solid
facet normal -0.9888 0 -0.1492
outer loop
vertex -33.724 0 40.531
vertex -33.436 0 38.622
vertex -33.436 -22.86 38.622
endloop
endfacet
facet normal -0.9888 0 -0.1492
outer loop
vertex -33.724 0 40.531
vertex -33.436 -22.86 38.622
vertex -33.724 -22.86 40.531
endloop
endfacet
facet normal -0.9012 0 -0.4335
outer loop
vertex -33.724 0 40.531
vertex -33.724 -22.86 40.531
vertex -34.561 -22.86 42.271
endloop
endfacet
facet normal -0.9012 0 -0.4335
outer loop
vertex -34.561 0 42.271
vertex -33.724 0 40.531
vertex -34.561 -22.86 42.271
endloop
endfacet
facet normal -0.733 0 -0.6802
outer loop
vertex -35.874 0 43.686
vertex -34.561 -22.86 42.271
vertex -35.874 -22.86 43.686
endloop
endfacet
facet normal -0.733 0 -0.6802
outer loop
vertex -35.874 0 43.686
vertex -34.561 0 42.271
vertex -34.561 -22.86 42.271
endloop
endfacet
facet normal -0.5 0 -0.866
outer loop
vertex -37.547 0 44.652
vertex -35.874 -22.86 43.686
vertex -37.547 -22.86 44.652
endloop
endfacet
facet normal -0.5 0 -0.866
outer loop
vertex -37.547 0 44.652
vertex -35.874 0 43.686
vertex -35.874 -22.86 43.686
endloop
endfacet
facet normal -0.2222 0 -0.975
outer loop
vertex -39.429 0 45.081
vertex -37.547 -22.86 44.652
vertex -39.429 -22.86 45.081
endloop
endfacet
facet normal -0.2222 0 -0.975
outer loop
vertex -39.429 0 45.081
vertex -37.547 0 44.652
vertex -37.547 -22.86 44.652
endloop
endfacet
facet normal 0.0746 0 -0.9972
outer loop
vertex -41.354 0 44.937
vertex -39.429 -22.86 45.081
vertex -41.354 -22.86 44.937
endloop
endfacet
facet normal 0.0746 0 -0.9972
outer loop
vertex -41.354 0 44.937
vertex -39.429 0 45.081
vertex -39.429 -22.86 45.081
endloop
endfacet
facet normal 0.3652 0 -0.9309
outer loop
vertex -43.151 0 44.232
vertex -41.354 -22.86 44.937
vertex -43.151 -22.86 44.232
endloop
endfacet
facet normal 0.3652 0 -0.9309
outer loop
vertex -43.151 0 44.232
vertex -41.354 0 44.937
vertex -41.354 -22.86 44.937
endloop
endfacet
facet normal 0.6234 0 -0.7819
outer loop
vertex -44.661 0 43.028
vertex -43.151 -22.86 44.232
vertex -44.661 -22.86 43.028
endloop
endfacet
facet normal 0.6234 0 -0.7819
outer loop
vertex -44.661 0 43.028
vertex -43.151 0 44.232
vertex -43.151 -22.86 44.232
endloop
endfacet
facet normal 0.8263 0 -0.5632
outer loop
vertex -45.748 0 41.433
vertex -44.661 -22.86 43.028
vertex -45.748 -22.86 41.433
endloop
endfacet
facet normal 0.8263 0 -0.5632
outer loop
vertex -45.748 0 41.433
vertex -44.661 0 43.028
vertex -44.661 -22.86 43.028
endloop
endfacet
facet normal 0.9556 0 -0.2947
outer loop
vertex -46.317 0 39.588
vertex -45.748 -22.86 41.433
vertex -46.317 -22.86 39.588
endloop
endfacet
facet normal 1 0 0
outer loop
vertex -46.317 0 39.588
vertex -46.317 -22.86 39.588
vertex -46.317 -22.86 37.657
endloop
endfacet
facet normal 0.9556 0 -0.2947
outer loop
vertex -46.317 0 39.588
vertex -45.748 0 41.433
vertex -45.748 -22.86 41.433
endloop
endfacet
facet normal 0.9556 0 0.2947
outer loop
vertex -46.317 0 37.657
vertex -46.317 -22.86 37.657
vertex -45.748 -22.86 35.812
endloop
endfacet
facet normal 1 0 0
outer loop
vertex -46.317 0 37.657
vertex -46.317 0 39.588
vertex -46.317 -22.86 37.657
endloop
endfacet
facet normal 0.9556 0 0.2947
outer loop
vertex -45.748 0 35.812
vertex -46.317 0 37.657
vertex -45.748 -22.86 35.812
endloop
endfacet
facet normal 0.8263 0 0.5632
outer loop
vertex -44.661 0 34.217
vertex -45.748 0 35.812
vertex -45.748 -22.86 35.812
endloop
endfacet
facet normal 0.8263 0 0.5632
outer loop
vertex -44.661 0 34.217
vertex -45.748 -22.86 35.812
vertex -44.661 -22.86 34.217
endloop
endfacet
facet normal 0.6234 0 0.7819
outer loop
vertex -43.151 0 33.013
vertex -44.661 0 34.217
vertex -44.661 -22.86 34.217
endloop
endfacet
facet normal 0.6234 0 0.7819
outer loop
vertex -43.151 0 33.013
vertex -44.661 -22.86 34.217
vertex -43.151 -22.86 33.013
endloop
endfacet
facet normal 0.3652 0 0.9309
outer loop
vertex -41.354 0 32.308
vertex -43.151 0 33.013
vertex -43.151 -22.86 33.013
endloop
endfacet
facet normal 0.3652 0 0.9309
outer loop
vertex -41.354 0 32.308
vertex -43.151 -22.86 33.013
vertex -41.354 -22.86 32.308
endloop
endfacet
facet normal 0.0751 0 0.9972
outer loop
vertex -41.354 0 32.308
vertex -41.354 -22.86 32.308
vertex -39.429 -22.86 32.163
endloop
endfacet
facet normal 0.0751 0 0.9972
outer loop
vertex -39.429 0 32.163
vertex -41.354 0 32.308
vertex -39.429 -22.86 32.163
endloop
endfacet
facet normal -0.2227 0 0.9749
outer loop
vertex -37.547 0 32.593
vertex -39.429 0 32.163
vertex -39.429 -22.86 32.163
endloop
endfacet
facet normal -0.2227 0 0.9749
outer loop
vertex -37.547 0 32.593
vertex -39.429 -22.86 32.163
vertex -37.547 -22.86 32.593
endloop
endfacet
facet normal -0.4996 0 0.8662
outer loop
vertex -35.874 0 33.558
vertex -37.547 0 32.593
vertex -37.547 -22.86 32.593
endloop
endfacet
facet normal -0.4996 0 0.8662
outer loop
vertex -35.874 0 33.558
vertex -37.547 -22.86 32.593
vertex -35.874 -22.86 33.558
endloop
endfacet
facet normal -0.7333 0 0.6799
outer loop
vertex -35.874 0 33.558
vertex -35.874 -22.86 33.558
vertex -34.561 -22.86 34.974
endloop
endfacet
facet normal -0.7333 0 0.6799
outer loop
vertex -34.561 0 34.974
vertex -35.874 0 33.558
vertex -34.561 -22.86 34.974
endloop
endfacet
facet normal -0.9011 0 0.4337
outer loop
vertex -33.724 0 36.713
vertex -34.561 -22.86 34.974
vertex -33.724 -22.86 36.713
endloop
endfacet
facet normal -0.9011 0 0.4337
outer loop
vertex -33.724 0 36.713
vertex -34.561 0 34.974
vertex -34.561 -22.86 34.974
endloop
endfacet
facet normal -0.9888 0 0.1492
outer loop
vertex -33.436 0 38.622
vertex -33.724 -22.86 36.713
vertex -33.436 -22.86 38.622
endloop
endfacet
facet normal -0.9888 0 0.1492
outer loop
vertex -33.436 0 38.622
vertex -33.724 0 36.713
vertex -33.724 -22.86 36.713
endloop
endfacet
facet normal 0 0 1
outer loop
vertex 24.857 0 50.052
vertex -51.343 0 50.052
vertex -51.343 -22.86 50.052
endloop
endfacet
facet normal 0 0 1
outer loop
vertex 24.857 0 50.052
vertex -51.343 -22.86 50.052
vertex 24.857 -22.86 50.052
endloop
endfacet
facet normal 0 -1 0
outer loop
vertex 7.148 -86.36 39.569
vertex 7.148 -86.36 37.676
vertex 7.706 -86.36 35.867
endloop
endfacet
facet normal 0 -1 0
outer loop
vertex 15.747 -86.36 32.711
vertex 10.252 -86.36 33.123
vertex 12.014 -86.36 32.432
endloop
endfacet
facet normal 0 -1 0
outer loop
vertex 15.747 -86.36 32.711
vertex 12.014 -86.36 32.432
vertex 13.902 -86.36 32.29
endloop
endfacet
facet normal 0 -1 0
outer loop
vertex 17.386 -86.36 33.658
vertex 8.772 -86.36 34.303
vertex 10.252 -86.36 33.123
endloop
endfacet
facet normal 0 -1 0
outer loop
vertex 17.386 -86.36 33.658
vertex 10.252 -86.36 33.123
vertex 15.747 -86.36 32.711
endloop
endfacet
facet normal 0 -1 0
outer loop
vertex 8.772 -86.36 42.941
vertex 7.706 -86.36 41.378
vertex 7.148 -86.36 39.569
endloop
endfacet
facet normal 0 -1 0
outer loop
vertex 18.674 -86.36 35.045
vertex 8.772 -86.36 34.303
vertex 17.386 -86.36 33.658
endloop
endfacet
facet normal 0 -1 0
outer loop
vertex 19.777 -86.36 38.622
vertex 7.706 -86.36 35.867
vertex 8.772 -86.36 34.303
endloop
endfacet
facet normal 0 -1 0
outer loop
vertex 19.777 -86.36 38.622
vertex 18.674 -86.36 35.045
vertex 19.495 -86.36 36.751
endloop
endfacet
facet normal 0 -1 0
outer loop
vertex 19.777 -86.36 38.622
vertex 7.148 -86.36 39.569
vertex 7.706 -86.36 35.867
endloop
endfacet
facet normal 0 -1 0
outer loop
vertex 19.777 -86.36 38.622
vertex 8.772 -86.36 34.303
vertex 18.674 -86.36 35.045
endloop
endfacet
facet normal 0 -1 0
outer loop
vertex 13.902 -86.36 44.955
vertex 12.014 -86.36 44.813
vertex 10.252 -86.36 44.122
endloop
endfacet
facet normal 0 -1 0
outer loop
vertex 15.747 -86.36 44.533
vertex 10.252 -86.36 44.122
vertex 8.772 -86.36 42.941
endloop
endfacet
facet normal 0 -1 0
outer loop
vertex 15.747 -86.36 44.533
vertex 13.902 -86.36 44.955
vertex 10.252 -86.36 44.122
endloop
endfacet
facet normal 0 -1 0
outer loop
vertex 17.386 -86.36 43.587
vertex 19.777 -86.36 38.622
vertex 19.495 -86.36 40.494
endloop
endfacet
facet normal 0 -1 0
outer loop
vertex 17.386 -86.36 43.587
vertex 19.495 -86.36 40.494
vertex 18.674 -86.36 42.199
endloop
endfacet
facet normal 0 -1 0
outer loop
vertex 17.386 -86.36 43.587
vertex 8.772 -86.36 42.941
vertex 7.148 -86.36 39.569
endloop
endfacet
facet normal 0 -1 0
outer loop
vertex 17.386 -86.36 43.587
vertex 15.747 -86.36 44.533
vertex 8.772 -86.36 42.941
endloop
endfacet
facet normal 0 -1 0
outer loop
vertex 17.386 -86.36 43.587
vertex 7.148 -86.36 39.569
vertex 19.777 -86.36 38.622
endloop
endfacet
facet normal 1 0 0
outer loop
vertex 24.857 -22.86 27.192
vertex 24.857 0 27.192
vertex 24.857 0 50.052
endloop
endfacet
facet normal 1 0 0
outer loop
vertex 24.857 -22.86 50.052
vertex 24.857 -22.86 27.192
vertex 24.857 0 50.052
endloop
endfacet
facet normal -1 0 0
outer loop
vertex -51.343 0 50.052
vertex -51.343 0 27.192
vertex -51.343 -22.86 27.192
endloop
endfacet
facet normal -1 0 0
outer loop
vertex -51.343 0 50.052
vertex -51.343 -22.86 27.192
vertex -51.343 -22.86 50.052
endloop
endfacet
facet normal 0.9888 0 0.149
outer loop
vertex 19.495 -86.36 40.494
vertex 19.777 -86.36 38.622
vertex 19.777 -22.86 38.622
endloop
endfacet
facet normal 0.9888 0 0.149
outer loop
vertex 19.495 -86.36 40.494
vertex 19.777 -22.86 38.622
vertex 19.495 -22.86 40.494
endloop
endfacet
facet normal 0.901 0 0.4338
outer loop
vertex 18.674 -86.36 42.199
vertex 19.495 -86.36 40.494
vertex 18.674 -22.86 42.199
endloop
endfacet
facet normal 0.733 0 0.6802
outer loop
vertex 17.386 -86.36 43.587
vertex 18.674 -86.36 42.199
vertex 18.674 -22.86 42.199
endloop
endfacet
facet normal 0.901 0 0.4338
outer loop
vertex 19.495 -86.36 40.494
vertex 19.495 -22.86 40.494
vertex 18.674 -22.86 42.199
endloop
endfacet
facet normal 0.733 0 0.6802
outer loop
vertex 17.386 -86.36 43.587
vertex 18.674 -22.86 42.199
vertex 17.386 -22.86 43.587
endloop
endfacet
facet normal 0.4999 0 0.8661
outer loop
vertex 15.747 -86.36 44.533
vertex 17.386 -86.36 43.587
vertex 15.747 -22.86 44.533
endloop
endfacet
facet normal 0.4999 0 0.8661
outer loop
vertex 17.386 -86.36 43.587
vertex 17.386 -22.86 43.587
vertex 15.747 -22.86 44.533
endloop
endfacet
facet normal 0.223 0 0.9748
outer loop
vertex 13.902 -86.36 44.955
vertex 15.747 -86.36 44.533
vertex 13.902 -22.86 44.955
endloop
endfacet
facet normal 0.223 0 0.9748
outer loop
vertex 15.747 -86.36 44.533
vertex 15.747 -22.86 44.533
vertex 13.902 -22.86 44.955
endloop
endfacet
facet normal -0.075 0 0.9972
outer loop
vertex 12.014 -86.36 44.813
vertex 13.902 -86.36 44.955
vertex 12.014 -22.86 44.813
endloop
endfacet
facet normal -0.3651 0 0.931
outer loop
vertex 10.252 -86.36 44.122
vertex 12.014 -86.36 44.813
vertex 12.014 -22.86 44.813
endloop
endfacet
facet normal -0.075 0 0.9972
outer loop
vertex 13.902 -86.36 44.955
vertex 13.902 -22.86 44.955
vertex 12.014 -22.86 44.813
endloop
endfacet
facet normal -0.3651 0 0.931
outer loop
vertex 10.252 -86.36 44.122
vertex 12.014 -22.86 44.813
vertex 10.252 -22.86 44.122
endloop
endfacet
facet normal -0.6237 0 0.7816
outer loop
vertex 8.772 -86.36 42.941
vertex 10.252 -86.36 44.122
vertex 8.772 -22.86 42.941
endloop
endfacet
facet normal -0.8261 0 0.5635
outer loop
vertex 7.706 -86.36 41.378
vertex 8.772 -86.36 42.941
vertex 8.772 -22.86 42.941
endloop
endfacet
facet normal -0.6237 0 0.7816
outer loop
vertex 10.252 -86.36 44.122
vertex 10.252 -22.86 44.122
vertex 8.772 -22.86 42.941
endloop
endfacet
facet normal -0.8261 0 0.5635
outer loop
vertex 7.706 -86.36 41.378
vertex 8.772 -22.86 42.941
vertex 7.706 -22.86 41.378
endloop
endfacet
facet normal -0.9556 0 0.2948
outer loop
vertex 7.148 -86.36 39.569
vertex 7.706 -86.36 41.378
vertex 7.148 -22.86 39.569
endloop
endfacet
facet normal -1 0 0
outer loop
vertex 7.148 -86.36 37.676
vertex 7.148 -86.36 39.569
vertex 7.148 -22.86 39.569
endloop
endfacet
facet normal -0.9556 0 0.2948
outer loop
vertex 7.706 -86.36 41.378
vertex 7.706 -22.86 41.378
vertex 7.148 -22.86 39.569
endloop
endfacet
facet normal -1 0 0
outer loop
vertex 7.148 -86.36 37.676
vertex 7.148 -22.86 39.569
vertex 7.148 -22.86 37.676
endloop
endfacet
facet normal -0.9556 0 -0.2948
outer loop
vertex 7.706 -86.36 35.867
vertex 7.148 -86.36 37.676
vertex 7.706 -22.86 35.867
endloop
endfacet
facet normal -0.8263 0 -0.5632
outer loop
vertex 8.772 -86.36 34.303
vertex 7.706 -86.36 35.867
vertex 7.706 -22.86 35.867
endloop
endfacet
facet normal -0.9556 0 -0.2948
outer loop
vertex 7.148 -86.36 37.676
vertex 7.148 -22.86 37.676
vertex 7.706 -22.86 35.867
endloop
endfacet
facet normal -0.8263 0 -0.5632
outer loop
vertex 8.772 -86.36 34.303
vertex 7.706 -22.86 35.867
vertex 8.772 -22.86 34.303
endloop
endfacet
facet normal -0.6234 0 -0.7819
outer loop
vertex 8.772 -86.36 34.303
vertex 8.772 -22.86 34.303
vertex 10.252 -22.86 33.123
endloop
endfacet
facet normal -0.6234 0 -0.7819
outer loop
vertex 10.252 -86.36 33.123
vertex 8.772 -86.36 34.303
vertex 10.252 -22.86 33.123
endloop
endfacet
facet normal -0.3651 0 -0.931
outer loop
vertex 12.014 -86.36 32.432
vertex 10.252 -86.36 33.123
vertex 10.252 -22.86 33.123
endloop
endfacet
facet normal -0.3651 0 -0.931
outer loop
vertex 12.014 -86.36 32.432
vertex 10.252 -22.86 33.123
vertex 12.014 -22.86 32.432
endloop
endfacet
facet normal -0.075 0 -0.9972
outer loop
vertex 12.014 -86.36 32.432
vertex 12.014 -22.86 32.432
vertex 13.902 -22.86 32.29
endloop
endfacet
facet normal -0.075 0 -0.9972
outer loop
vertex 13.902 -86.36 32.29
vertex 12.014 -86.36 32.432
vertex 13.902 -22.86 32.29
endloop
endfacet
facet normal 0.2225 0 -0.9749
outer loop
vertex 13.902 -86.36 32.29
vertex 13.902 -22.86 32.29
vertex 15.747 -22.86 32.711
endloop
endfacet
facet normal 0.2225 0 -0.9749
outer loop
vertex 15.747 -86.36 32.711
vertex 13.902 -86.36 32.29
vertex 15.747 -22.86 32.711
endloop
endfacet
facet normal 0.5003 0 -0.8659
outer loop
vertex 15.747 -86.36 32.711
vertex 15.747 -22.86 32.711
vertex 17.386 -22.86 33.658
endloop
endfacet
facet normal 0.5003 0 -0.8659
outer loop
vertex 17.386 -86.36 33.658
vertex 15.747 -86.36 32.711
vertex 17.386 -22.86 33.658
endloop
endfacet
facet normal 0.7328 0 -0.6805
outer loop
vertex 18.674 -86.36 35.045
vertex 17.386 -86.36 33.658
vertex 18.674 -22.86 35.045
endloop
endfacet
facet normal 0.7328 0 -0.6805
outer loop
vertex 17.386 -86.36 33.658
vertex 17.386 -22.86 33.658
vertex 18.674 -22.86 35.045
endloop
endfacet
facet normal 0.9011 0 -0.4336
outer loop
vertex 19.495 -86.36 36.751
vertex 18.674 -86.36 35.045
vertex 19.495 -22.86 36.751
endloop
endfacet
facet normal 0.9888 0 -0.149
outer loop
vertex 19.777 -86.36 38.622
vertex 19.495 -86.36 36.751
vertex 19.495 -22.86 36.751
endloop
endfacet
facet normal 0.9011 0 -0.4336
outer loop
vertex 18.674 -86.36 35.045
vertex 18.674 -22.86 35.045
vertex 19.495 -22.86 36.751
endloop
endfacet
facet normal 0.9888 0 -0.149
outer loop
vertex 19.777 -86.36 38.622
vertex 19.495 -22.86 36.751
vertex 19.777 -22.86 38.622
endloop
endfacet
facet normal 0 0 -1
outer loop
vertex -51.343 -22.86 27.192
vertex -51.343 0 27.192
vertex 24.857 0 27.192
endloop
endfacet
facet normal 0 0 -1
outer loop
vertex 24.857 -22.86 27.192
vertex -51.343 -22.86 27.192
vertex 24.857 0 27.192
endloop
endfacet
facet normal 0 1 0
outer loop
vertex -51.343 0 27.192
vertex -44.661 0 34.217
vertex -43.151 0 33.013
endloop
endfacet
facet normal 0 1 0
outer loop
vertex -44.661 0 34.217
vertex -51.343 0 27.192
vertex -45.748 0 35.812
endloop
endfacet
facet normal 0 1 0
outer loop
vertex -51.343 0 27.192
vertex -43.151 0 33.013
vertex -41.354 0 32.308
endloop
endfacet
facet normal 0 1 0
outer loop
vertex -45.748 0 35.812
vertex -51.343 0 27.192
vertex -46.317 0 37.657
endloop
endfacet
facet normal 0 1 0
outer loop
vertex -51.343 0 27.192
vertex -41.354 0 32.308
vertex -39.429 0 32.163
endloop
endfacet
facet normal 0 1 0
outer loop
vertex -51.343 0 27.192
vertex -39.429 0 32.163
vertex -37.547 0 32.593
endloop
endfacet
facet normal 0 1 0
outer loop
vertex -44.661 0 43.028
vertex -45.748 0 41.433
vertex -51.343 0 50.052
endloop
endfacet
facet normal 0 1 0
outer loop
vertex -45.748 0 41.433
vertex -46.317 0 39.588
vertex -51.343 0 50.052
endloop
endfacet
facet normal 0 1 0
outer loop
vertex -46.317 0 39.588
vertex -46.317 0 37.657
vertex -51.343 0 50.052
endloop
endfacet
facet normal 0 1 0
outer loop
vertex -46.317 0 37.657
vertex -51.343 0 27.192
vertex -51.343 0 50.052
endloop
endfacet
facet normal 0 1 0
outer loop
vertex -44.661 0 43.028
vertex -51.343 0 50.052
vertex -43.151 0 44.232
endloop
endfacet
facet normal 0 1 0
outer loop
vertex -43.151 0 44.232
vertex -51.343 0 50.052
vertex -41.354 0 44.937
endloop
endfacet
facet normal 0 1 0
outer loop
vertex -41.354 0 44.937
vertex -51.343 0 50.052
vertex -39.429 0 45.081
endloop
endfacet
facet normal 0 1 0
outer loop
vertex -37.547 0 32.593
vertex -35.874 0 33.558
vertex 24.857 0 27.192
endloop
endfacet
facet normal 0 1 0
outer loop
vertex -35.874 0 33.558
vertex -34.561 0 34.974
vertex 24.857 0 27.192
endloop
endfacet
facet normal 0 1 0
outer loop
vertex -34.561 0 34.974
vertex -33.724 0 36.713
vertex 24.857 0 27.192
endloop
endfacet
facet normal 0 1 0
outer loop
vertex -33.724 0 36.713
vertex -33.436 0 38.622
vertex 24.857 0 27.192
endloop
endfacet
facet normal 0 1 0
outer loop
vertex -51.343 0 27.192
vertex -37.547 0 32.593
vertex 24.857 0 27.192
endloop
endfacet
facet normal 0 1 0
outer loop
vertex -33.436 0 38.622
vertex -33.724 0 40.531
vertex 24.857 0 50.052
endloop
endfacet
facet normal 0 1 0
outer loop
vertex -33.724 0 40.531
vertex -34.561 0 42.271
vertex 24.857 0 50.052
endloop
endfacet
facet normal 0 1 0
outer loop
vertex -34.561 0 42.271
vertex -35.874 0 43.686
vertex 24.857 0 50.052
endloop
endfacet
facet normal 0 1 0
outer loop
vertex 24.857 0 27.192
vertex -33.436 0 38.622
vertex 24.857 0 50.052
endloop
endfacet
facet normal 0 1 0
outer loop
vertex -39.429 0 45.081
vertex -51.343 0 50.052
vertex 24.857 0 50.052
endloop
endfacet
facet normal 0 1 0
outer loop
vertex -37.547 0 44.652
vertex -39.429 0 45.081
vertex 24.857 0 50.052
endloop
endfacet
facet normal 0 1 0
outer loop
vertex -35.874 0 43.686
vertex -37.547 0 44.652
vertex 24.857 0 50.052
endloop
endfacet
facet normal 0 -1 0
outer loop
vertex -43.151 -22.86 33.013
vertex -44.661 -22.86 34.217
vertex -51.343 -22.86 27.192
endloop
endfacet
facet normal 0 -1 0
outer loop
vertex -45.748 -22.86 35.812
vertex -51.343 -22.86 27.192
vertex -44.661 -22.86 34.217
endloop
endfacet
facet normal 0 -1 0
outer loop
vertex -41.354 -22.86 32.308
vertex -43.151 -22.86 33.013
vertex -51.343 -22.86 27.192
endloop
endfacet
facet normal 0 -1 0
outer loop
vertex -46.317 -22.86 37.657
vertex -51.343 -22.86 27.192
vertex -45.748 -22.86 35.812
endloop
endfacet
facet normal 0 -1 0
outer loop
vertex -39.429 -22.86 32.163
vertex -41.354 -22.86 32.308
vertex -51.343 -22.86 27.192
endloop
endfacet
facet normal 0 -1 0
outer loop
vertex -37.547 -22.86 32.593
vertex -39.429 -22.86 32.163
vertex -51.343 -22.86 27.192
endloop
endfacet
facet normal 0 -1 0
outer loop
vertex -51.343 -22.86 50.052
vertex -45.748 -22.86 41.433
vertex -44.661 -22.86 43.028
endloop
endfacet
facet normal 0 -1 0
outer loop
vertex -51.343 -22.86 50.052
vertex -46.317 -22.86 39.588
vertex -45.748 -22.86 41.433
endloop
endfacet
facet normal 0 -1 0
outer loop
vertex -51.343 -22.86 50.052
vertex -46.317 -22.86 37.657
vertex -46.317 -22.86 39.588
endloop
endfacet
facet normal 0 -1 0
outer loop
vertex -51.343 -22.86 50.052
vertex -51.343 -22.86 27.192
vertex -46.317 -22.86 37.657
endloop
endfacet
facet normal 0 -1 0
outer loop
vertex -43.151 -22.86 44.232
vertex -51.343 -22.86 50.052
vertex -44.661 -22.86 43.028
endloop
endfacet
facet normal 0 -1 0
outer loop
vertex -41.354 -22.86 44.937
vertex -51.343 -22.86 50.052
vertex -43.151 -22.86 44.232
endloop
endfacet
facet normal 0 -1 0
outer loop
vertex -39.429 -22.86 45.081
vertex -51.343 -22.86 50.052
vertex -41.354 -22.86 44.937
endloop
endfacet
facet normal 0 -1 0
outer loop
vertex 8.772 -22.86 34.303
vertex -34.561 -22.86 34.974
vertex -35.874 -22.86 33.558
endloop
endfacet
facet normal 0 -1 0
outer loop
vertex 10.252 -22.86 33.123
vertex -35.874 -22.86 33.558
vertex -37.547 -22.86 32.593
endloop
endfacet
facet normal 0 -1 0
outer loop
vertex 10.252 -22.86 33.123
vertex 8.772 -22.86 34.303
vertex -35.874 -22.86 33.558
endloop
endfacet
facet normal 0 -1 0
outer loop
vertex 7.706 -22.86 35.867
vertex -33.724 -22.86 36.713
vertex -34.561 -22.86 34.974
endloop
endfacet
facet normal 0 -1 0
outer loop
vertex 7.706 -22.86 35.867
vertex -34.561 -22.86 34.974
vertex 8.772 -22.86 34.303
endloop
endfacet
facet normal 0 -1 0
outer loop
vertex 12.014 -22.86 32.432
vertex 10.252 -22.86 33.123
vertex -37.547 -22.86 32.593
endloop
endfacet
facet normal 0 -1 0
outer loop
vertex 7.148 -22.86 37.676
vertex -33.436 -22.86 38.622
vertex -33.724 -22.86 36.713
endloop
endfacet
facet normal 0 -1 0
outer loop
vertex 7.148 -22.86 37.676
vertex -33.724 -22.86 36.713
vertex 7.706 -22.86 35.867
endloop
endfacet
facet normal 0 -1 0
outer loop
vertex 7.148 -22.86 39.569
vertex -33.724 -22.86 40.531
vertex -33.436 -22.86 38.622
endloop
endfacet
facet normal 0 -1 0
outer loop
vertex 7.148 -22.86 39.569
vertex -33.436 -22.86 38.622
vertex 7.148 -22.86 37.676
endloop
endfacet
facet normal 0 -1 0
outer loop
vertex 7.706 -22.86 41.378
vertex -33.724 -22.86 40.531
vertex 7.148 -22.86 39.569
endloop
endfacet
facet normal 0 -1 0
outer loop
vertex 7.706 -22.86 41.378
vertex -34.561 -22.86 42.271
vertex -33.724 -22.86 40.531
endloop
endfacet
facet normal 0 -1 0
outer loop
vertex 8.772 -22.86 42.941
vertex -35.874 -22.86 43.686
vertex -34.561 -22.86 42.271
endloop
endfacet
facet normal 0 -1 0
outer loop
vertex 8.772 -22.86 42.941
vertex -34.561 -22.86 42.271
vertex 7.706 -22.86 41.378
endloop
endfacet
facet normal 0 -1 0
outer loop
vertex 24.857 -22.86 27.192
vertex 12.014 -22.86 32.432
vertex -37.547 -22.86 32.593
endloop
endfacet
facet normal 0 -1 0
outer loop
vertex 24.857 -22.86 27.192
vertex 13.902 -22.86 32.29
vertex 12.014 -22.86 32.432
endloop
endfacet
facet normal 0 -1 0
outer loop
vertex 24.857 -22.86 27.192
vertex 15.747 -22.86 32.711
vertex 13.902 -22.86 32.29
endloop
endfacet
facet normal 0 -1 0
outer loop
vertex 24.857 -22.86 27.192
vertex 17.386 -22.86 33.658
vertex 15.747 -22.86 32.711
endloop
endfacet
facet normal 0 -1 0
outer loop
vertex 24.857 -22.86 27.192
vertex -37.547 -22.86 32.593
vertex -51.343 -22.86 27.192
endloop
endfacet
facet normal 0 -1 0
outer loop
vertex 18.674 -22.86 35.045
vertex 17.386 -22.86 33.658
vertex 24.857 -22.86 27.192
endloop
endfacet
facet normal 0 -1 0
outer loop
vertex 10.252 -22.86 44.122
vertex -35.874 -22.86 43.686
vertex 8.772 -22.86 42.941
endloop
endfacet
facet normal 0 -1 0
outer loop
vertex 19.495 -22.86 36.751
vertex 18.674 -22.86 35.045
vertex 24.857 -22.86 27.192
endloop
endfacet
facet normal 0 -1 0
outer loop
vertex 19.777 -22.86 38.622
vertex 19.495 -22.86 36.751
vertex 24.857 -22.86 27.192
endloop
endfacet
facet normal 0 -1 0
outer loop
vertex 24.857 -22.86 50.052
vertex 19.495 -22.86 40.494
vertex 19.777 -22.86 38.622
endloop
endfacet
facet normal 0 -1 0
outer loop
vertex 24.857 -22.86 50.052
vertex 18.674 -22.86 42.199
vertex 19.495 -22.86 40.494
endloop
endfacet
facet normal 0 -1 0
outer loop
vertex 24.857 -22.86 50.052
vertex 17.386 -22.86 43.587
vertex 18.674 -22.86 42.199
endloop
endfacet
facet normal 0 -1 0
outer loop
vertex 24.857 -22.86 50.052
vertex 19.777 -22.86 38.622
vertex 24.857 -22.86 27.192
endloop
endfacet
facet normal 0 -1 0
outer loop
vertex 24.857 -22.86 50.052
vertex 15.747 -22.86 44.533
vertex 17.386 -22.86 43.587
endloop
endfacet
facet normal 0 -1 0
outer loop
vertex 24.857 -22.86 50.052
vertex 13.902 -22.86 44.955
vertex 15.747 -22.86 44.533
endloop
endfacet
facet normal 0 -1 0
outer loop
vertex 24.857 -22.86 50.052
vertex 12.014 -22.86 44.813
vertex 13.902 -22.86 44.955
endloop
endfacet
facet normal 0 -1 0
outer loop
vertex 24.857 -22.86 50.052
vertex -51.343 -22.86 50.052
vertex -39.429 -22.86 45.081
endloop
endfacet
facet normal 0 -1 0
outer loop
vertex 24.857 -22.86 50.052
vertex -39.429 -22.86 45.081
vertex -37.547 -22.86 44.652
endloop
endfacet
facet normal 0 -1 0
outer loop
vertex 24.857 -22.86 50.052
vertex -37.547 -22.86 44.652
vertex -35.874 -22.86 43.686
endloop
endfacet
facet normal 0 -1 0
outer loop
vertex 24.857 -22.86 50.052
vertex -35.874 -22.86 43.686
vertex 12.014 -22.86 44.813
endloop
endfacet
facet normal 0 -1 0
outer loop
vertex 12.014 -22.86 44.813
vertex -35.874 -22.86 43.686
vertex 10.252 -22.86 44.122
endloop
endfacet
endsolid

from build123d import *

# Parameters (mm, degrees)
F0_W     = 76.2
F0_H     = 22.86
F0_R     = 6.477
F1_DEPTH = 22.86
F2_R     = 6.35
F3_DEPTH = 63.5


with BuildPart() as f1:
    # F0 (on Front) → F1 (new body)
    with BuildSketch(Plane.XZ):
        with Locations((-13.242823, 38.622339)):
            Rectangle(F0_W, F0_H)
        with Locations((-39.912823, 38.622339)):
            Circle(F0_R, mode=Mode.SUBTRACT)
    extrude(amount=F1_DEPTH)

    # F2 (on face) → F3 (join)
    with BuildSketch(Plane.XZ.offset(22.86)):
        with Locations((13.427177, 38.622339)):
            Circle(F2_R)
    extrude(amount=F3_DEPTH)


solid = f1.part
